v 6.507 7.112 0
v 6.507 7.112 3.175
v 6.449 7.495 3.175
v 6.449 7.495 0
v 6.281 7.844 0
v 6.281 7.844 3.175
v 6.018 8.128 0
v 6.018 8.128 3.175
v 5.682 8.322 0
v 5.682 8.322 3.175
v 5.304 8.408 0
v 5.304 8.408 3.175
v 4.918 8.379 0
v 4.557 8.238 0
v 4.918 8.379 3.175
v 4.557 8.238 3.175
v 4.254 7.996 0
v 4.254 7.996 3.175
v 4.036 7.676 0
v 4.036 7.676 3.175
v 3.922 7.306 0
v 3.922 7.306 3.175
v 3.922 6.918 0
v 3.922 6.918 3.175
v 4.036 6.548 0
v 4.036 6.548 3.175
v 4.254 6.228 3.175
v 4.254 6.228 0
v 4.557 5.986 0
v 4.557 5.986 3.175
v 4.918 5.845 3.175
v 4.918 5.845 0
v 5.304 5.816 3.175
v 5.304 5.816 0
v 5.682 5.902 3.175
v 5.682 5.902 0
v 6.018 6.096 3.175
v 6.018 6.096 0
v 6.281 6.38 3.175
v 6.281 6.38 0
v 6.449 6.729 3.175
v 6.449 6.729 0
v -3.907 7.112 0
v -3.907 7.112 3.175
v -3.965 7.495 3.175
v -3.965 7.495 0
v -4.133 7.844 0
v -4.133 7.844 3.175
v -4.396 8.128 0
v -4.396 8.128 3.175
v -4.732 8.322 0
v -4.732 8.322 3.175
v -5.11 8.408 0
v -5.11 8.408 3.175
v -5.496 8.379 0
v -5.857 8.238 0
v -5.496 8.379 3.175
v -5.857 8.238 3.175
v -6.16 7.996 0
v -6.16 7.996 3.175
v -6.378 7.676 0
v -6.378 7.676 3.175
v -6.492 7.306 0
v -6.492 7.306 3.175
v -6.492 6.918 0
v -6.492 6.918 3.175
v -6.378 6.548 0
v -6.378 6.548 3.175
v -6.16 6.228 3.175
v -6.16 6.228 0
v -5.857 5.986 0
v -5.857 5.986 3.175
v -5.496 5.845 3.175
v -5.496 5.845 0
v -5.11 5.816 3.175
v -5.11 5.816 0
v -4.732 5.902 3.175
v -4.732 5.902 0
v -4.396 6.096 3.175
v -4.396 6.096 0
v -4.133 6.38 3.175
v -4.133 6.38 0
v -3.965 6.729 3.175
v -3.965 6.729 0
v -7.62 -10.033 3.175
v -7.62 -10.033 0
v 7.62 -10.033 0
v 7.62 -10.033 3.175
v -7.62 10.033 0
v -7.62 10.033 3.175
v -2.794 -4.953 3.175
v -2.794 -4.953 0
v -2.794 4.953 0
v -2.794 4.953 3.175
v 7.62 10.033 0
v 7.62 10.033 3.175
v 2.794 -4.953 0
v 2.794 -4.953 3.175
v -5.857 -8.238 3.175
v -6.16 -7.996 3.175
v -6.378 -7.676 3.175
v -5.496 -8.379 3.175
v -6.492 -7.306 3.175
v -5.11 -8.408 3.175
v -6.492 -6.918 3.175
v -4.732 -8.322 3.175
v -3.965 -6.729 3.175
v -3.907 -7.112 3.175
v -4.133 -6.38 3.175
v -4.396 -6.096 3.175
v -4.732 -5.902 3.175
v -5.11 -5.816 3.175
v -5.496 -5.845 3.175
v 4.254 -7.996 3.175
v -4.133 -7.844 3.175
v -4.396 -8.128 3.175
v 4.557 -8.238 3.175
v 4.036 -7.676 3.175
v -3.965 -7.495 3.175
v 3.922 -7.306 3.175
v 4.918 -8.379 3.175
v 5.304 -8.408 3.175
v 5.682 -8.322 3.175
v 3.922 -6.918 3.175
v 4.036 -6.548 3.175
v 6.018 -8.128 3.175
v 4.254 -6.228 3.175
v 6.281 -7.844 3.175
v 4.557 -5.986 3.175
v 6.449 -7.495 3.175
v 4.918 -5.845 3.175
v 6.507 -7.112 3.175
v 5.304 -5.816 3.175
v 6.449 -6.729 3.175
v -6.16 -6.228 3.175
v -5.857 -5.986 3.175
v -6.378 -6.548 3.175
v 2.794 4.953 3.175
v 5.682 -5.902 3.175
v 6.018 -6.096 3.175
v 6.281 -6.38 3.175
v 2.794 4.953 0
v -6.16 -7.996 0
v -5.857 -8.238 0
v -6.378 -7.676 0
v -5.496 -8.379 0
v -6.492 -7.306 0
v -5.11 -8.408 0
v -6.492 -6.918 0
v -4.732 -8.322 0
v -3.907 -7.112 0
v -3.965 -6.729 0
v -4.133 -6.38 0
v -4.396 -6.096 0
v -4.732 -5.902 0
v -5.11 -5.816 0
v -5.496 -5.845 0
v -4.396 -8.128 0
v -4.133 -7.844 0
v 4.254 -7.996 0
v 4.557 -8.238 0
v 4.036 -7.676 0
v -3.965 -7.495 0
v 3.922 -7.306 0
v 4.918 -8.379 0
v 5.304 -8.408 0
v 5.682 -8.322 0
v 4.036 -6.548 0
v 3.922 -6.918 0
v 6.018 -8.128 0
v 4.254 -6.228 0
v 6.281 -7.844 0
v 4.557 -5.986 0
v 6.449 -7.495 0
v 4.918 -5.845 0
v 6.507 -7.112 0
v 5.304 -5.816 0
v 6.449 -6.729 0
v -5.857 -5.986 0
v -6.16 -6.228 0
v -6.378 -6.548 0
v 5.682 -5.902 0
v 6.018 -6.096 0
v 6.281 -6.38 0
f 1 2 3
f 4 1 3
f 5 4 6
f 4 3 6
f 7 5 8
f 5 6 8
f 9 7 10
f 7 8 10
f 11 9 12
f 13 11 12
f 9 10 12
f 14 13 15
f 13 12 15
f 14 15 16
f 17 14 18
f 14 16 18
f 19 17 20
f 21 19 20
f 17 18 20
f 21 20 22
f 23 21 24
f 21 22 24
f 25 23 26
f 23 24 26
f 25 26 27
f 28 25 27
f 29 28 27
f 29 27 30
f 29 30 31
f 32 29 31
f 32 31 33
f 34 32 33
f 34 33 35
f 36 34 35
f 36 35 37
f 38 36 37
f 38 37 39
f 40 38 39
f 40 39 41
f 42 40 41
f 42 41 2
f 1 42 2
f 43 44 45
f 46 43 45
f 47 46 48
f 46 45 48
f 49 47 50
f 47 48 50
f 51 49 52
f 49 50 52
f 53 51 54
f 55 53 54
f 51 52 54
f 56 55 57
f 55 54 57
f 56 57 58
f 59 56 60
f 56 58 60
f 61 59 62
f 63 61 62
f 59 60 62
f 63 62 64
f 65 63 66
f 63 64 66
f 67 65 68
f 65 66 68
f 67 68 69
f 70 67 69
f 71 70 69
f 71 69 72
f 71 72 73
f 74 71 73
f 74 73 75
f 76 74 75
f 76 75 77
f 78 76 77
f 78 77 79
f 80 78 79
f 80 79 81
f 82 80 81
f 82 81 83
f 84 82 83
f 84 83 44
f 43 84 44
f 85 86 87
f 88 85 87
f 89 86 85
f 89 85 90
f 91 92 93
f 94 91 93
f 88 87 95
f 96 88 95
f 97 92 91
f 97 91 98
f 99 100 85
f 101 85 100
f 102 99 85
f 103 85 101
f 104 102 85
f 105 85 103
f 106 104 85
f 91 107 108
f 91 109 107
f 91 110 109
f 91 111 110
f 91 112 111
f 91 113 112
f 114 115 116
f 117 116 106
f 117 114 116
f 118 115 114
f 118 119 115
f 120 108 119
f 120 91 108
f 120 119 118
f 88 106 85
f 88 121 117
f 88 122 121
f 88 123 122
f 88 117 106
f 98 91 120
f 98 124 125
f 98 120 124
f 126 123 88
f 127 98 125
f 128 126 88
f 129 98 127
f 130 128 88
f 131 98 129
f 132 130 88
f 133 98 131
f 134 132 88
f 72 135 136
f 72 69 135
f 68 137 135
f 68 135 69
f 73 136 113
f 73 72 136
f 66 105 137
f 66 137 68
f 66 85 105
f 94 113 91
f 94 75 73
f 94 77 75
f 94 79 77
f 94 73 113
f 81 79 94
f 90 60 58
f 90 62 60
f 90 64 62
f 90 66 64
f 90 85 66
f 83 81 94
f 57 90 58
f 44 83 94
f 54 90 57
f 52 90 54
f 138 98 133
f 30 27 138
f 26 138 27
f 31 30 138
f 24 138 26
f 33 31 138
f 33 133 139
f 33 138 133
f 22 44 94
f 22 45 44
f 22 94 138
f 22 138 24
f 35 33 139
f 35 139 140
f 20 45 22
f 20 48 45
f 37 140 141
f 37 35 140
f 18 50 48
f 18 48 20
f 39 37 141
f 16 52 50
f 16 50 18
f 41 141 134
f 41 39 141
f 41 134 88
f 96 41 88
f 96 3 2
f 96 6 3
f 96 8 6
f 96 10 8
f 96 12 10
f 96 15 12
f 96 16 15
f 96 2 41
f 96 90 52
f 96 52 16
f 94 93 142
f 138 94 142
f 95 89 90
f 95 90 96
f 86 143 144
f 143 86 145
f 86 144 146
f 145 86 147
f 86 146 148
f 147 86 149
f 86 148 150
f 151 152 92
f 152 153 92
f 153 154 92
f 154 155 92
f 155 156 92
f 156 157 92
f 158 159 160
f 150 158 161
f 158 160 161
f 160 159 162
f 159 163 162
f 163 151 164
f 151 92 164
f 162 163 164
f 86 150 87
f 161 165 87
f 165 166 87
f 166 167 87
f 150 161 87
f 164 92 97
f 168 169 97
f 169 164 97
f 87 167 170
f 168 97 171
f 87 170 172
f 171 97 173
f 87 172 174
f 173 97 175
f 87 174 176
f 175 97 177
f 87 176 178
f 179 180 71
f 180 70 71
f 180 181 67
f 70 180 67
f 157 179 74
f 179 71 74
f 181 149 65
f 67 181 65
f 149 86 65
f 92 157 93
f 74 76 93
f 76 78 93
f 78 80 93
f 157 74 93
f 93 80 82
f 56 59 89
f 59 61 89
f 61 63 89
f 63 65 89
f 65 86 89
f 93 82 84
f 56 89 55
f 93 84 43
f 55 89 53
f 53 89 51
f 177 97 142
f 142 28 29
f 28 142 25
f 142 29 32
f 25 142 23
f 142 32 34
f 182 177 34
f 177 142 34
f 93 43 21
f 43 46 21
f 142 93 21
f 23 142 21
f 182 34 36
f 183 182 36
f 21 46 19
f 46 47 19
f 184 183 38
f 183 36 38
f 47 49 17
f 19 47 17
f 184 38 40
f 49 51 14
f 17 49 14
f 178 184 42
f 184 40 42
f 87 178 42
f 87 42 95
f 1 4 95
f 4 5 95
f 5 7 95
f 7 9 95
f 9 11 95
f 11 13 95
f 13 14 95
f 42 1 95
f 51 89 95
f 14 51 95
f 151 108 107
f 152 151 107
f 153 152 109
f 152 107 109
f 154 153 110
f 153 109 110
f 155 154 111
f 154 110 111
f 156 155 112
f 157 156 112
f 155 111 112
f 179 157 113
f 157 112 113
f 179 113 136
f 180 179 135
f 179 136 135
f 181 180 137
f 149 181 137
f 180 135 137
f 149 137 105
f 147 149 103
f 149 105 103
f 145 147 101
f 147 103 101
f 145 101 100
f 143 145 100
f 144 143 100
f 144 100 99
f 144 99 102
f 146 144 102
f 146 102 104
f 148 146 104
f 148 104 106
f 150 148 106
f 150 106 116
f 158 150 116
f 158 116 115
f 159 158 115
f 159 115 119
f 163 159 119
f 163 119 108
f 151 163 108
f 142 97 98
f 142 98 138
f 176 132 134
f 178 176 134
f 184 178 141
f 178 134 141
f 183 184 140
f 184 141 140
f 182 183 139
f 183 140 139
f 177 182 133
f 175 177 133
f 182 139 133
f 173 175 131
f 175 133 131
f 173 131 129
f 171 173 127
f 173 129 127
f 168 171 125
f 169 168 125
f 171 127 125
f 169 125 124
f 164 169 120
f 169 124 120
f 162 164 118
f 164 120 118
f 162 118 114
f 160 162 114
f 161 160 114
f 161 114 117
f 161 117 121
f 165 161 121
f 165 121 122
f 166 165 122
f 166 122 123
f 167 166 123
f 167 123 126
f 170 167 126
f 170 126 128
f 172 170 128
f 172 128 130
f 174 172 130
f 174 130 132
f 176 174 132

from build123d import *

# Parameters (mm, degrees)
SKETCH1_W           = 15.24
SKETCH1_H           = 20.066
SKETCH1_W_2         = 5.588
SKETCH1_H_2         = 9.906
BOSS_EXTRUDE1_DEPTH = 3.175
CUT_EXTRUDE1_REACH  = 14.993
SKETCH2_R           = 1.3


with BuildPart() as part:
    # Sketch1 → Boss-Extrude1 (new body)
    with BuildSketch(Plane.XY):
        Rectangle(SKETCH1_W, SKETCH1_H)
        Rectangle(SKETCH1_W_2, SKETCH1_H_2, mode=Mode.SUBTRACT)
    extrude(amount=BOSS_EXTRUDE1_DEPTH)

    # Sketch2 → Cut-Extrude1 (cut, up to next)
    with BuildSketch(Plane.XY.offset(3.175), mode=Mode.PRIVATE) as cut_extrude1_sk1:
        with Locations((-5.207, 7.112)):
            Circle(SKETCH2_R)
    cut_extrude1_tool1 = extrude(cut_extrude1_sk1.sketch, amount=-CUT_EXTRUDE1_REACH, mode=Mode.PRIVATE) & part.part
    # Sketch2 → Cut-Extrude1 (cut, up to next)
    with BuildSketch(Plane.XY.offset(3.175), mode=Mode.PRIVATE) as cut_extrude1_sk2:
        with Locations((5.207, 7.112)):
            Circle(SKETCH2_R)
    cut_extrude1_tool2 = extrude(cut_extrude1_sk2.sketch, amount=-CUT_EXTRUDE1_REACH, mode=Mode.PRIVATE) & part.part
    # Sketch2 → Cut-Extrude1 (cut, up to next)
    with BuildSketch(Plane.XY.offset(3.175), mode=Mode.PRIVATE) as cut_extrude1_sk3:
        with Locations((5.207, -7.112)):
            Circle(SKETCH2_R)
    cut_extrude1_tool3 = extrude(cut_extrude1_sk3.sketch, amount=-CUT_EXTRUDE1_REACH, mode=Mode.PRIVATE) & part.part
    # Sketch2 → Cut-Extrude1 (cut, up to next)
    with BuildSketch(Plane.XY.offset(3.175), mode=Mode.PRIVATE) as cut_extrude1_sk4:
        with Locations((-5.207, -7.112)):
            Circle(SKETCH2_R)
    cut_extrude1_tool4 = extrude(cut_extrude1_sk4.sketch, amount=-CUT_EXTRUDE1_REACH, mode=Mode.PRIVATE) & part.part
    add(cut_extrude1_tool1.solids().sort_by_distance((-5.207, 7.112, 3.175))[0], mode=Mode.SUBTRACT)
    add(cut_extrude1_tool2.solids().sort_by_distance((5.207, 7.112, 3.175))[0], mode=Mode.SUBTRACT)
    add(cut_extrude1_tool3.solids().sort_by_distance((5.207, -7.112, 3.175))[0], mode=Mode.SUBTRACT)
    add(cut_extrude1_tool4.solids().sort_by_distance((-5.207, -7.112, 3.175))[0], mode=Mode.SUBTRACT)


solid = part.part
